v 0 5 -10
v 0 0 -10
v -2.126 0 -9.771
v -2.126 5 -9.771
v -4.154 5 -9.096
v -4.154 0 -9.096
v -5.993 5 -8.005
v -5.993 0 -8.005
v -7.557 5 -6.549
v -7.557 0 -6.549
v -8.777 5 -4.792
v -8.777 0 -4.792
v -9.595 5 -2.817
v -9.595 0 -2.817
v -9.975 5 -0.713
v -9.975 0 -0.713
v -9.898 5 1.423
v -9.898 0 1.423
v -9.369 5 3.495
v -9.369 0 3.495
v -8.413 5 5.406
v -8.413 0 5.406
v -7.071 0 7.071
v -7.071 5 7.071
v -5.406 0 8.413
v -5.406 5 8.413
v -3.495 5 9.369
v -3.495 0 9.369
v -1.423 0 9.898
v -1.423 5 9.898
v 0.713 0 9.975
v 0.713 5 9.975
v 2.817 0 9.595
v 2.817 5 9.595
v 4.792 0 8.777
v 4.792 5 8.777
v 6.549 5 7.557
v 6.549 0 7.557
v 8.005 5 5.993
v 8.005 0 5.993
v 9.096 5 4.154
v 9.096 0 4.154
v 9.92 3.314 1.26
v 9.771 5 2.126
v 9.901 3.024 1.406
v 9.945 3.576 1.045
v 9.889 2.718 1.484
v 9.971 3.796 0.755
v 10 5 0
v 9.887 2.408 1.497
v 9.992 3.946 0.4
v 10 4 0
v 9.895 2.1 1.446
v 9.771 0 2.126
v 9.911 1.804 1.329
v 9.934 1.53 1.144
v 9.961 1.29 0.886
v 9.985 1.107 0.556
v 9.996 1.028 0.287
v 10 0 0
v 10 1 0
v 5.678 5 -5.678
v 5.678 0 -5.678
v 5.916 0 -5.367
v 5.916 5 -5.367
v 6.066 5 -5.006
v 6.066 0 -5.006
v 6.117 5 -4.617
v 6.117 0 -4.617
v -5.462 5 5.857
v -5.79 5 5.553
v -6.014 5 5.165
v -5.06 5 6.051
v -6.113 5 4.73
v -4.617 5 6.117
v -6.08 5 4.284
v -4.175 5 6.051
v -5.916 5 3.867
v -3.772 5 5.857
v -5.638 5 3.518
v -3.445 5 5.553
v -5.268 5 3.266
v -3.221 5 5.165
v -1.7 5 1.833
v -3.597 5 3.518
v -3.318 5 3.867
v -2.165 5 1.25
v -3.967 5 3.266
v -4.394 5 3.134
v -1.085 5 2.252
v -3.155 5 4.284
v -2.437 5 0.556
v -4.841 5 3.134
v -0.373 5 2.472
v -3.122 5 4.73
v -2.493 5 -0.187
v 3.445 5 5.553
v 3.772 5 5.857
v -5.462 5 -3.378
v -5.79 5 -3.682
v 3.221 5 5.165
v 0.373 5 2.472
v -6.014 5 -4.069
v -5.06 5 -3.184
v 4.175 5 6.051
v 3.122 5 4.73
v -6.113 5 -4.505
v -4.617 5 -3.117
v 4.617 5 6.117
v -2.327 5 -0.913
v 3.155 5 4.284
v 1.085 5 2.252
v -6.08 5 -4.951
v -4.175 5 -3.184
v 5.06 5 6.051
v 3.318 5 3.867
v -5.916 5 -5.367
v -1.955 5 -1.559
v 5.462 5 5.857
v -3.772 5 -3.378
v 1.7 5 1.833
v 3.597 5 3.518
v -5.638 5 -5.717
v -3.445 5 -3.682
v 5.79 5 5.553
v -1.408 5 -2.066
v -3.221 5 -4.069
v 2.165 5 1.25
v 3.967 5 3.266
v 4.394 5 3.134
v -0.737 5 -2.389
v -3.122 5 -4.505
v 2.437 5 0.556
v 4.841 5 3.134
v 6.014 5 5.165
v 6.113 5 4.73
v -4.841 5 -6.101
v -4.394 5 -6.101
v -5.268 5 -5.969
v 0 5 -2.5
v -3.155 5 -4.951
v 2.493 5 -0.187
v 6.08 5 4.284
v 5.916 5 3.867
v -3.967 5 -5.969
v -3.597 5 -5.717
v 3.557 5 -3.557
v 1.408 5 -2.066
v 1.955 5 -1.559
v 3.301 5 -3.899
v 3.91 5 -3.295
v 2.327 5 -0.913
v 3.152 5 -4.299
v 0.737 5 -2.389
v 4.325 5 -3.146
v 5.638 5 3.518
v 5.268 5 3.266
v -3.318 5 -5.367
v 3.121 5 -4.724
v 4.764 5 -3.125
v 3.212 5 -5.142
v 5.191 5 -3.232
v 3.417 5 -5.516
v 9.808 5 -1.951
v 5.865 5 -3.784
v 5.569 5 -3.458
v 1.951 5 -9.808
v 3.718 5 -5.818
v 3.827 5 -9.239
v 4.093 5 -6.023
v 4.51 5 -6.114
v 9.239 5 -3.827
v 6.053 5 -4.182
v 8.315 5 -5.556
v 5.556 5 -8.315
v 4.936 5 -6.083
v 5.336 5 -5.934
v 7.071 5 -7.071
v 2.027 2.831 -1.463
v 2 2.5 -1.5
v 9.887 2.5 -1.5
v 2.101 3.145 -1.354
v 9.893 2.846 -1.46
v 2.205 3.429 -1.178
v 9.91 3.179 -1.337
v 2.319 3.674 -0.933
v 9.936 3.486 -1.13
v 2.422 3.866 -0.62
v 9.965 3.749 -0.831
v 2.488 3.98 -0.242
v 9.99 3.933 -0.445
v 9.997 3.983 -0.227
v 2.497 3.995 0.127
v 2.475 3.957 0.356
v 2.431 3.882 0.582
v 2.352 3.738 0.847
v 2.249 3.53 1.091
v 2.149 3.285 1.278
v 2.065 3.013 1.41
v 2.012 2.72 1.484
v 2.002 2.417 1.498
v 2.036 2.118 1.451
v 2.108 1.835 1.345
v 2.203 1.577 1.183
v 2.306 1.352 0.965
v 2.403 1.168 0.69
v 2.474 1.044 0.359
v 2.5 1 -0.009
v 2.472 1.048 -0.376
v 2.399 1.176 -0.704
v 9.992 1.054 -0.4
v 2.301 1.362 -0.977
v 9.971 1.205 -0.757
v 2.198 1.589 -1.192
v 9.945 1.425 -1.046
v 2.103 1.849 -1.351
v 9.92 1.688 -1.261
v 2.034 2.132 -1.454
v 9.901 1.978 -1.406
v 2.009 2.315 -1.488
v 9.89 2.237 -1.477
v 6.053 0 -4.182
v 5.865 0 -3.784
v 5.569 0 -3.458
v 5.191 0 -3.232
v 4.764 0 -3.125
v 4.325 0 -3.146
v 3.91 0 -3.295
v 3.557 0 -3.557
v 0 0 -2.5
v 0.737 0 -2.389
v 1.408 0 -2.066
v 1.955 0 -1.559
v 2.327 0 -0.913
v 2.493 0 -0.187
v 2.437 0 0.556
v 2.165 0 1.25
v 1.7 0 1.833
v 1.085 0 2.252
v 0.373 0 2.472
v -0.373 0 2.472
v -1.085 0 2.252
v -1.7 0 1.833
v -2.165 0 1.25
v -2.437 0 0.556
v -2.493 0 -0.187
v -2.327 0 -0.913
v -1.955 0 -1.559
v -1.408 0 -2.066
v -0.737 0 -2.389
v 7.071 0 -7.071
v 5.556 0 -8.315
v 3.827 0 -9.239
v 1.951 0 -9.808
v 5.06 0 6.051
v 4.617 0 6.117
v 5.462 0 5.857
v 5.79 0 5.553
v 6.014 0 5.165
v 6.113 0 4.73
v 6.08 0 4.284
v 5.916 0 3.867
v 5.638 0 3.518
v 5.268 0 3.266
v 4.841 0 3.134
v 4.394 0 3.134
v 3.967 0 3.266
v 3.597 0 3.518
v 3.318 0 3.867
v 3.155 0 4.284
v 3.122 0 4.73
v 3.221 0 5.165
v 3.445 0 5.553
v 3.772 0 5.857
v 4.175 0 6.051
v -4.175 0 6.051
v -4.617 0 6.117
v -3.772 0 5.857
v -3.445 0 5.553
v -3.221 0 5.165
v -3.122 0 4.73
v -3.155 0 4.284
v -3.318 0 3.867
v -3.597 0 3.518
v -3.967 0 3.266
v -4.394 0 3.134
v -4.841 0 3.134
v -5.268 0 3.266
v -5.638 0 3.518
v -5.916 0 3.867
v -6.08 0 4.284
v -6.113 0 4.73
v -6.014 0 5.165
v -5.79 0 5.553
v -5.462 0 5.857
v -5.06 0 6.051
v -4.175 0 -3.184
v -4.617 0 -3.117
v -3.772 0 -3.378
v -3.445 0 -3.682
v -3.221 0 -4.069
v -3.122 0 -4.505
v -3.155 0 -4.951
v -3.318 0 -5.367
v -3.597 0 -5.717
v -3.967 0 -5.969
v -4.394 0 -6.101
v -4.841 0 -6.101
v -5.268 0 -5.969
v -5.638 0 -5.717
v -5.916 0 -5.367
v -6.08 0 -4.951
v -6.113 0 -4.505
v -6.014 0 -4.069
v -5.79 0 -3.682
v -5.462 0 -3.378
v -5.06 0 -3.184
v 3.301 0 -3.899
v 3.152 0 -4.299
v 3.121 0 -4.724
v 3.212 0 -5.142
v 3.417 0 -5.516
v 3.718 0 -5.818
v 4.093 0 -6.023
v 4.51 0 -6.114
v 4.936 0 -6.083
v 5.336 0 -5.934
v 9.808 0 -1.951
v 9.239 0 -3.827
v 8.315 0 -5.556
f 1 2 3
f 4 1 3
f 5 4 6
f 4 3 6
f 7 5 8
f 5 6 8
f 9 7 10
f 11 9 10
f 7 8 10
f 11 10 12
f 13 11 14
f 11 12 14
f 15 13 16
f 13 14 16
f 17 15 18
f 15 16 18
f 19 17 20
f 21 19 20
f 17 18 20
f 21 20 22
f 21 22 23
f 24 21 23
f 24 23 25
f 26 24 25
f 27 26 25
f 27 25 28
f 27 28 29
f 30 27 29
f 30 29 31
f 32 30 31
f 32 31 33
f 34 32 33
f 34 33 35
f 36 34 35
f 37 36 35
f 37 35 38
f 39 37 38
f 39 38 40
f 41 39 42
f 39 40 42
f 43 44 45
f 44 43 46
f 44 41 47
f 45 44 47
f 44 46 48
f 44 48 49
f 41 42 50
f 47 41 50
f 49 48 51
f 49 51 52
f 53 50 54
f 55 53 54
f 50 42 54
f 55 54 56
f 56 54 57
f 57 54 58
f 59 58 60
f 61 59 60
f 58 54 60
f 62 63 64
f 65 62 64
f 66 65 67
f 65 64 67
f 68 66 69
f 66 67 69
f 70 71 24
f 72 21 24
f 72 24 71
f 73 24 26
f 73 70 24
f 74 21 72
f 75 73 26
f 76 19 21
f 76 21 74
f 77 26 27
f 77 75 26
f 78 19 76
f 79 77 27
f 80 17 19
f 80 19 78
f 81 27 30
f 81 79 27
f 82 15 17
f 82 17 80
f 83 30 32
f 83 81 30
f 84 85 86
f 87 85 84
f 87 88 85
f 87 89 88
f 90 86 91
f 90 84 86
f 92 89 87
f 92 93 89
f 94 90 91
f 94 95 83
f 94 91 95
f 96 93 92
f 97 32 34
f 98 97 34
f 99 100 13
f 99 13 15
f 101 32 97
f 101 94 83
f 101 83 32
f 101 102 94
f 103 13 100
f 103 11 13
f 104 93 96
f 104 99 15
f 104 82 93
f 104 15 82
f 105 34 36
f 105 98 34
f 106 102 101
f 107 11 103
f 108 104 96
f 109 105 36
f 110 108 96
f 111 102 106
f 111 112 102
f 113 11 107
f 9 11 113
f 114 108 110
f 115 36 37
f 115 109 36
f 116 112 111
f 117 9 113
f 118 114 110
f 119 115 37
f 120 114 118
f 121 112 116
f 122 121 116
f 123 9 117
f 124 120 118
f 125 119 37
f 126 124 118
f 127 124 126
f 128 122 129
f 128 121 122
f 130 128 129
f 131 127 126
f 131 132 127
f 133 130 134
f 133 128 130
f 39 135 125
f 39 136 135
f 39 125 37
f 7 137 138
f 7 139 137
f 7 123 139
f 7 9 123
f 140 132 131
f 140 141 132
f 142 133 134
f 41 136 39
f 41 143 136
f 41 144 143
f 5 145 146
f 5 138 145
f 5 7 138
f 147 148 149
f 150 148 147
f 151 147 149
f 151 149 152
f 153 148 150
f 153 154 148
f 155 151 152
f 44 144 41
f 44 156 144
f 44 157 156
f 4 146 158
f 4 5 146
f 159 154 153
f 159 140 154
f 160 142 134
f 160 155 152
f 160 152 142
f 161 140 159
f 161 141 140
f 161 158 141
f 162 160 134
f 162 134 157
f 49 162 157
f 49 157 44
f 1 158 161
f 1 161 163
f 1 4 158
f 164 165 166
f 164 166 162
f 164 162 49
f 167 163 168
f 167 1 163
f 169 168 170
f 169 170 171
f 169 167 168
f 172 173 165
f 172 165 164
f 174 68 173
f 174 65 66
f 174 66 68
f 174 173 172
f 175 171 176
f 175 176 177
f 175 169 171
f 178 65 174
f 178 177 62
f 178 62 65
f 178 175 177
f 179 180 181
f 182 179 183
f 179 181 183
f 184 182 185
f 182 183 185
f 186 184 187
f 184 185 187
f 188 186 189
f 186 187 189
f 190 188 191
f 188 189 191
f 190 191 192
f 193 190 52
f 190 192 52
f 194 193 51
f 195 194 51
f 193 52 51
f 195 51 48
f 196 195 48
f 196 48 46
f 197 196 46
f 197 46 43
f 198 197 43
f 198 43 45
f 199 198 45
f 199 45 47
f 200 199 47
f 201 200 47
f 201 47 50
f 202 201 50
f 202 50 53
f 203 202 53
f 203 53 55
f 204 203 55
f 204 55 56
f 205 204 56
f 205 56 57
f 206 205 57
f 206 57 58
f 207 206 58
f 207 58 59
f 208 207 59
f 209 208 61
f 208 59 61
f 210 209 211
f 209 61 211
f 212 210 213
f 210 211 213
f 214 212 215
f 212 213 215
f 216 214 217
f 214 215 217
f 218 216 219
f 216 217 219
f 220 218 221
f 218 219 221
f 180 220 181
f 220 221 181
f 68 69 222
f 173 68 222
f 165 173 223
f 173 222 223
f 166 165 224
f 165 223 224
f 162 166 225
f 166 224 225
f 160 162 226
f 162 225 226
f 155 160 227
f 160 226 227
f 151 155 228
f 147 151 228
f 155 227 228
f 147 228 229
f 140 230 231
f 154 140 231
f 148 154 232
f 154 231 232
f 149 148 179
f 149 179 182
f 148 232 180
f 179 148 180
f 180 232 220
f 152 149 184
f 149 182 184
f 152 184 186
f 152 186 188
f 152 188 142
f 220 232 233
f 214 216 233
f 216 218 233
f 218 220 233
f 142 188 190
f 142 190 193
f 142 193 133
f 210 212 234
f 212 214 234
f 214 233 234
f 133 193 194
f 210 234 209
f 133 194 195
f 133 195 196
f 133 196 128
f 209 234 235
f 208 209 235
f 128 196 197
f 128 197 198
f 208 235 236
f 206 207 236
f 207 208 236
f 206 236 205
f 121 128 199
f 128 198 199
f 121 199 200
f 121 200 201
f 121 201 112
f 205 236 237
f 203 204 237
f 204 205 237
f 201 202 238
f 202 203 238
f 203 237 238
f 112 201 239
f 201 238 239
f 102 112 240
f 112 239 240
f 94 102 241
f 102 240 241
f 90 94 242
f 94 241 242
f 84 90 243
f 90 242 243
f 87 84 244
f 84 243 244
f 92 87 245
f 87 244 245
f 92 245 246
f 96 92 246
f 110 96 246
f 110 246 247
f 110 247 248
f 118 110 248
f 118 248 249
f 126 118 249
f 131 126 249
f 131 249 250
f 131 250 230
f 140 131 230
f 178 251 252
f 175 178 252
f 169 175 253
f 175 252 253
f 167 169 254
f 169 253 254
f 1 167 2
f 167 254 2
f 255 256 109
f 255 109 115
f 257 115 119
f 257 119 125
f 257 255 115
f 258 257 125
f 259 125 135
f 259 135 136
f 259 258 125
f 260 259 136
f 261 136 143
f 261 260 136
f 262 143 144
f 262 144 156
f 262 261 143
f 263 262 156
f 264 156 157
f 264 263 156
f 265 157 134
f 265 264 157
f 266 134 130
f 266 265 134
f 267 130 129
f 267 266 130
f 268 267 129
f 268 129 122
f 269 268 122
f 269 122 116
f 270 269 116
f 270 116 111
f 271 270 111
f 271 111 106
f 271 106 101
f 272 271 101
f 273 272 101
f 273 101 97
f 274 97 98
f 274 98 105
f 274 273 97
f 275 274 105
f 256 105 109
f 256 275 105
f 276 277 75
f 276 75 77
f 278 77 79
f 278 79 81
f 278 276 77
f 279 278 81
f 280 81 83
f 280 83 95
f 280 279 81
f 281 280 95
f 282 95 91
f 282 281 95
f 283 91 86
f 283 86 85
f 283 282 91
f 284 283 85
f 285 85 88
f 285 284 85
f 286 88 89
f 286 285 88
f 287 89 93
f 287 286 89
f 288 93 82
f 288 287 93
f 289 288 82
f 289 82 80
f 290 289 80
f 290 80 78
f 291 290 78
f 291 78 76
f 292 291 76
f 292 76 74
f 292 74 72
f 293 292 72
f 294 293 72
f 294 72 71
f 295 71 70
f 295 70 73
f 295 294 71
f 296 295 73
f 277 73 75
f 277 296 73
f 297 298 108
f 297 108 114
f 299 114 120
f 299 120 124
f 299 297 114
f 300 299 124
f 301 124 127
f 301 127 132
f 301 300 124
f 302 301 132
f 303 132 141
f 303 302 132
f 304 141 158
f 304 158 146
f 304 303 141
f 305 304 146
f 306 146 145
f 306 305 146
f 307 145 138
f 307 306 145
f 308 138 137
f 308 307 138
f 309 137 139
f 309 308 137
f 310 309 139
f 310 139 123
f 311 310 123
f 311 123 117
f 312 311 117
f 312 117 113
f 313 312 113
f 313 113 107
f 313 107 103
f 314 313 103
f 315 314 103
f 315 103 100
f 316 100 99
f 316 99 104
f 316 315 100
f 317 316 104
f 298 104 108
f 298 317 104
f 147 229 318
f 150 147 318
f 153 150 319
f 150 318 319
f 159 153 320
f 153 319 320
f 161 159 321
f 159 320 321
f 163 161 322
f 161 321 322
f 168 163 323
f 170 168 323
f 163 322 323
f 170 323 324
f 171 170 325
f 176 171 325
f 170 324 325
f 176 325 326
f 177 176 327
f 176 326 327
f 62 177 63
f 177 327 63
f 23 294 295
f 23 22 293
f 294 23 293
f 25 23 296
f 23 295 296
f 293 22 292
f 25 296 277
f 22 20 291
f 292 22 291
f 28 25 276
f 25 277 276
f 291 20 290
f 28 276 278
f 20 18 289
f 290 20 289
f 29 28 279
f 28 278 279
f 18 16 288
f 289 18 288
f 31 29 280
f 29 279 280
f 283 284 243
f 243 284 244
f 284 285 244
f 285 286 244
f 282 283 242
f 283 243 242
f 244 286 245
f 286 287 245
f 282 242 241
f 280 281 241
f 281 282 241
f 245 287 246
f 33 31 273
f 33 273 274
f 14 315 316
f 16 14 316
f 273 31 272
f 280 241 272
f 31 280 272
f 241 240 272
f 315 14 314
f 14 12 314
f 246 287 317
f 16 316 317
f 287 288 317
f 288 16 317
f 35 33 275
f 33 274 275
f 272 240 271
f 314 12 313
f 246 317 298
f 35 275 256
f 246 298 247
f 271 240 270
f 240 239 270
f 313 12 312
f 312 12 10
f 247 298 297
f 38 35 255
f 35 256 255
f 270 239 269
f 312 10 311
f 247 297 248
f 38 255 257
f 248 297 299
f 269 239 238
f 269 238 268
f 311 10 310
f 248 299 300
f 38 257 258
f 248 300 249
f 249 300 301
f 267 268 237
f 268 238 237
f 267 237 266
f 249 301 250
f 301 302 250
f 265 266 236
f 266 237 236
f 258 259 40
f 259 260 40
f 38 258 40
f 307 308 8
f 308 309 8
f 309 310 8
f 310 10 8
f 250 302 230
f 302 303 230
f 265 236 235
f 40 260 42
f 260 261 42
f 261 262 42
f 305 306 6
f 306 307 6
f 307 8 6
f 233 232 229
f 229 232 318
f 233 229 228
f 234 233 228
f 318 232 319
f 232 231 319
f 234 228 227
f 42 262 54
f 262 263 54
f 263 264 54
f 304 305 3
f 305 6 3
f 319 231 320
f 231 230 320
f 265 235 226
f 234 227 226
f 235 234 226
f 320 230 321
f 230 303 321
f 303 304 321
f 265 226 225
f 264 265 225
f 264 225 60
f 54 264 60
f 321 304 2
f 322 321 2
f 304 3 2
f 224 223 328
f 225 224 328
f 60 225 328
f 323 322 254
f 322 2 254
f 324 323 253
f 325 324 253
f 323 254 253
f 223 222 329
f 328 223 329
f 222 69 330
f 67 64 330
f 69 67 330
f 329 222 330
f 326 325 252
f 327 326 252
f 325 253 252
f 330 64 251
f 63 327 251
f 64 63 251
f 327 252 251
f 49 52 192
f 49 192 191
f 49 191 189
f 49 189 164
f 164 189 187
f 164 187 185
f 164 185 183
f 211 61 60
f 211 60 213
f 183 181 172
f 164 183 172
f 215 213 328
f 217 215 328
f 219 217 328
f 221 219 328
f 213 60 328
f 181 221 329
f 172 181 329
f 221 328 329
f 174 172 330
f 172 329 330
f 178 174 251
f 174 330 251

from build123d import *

# Parameters (mm, degrees)
SKETCH_1_R          = 1.5
EXTRUDE_1_DEPTH     = 5
SKETCH_2_R          = 1.5
CUT_EXTRUDE_4_DEPTH = 9
SKETCH1_R           = 2.5
CUT_EXTRUDE1_DEPTH  = 10


with BuildPart() as part:
    # Эскиз1 → Бобышка-Вытянуть1 (new body)
    # profile 1 of 2: a face of its own
    with BuildSketch(Plane(origin=(0, 0, 0), x_dir=(1, 0, 0), z_dir=(0, 1, 0))):
        with BuildLine():
            Line((0, 10), (0, 2))
            ThreePointArc((0, 2), (0.765366865, 1.847759065), (1.414213562, 1.414213562))
            Line((1.414213562, 1.414213562), (3.556747109, 3.556747109))
            ThreePointArc((3.556747109, 3.556747109), (3.556747109, 5.678067453), (5.678067453, 5.678067453))
            Line((5.678067453, 5.678067453), (7.071067812, 7.071067812))
            ThreePointArc((7.071067812, 7.071067812), (3.826834324, 9.238795325), (0, 10))
        make_face()
    # profile 2 of 2: a face of its own
    with BuildSketch(Plane(origin=(0, 0, 0), x_dir=(1, 0, 0), z_dir=(0, 1, 0))):
        with BuildLine():
            ThreePointArc((2, 0), (-1.414213562, -1.414213562), (0, 2))
            Line((0, 2), (0, 10))
            ThreePointArc((0, 10), (-7.071067812, -7.071067812), (10, 0))
            ThreePointArc((10, 0), (9.238795325, 3.826834324), (7.071067812, 7.071067812))
            Line((7.071067812, 7.071067812), (5.678067453, 5.678067453))
            ThreePointArc((5.678067453, 5.678067453), (6.00322658, 5.19143243), (6.117407281, 4.617407281))
            ThreePointArc((6.117407281, 4.617407281), (5.19143243, 3.231587982), (3.556747109, 3.556747109))
            Line((3.556747109, 3.556747109), (1.414213562, 1.414213562))
            ThreePointArc((1.414213562, 1.414213562), (1.847759065, 0.765366865), (2, 0))
        make_face()
        with Locations(Location((-4.617407281, -4.617407281, 0), (0, 0, 270))):
            Circle(SKETCH_1_R, mode=Mode.SUBTRACT)
        with Locations(Location((4.617407281, -4.617407281, 0), (0, 0, 270))):
            Circle(SKETCH_1_R, mode=Mode.SUBTRACT)
        with Locations(Location((-4.617407281, 4.617407281, 0), (0, 0, 270))):
            Circle(SKETCH_1_R, mode=Mode.SUBTRACT)
    extrude(amount=EXTRUDE_1_DEPTH)

    # Эскиз2 → Вырез-Вытянуть4 (cut)
    with BuildSketch(Plane(origin=(10, 0, 0), x_dir=(0, 0, -1), z_dir=(1, 0, 0))):
        with Locations((0, 2.5)):
            Circle(SKETCH_2_R)
    extrude(amount=-CUT_EXTRUDE_4_DEPTH, mode=Mode.SUBTRACT)

    # Sketch1 → Cut-Extrude1 (cut)
    with BuildSketch(Plane.XZ):
        with Locations(Location((0, 0, 0), (0, 0, 270))):
            Circle(SKETCH1_R)
    extrude(amount=-CUT_EXTRUDE1_DEPTH, mode=Mode.SUBTRACT)


solid = part.part
